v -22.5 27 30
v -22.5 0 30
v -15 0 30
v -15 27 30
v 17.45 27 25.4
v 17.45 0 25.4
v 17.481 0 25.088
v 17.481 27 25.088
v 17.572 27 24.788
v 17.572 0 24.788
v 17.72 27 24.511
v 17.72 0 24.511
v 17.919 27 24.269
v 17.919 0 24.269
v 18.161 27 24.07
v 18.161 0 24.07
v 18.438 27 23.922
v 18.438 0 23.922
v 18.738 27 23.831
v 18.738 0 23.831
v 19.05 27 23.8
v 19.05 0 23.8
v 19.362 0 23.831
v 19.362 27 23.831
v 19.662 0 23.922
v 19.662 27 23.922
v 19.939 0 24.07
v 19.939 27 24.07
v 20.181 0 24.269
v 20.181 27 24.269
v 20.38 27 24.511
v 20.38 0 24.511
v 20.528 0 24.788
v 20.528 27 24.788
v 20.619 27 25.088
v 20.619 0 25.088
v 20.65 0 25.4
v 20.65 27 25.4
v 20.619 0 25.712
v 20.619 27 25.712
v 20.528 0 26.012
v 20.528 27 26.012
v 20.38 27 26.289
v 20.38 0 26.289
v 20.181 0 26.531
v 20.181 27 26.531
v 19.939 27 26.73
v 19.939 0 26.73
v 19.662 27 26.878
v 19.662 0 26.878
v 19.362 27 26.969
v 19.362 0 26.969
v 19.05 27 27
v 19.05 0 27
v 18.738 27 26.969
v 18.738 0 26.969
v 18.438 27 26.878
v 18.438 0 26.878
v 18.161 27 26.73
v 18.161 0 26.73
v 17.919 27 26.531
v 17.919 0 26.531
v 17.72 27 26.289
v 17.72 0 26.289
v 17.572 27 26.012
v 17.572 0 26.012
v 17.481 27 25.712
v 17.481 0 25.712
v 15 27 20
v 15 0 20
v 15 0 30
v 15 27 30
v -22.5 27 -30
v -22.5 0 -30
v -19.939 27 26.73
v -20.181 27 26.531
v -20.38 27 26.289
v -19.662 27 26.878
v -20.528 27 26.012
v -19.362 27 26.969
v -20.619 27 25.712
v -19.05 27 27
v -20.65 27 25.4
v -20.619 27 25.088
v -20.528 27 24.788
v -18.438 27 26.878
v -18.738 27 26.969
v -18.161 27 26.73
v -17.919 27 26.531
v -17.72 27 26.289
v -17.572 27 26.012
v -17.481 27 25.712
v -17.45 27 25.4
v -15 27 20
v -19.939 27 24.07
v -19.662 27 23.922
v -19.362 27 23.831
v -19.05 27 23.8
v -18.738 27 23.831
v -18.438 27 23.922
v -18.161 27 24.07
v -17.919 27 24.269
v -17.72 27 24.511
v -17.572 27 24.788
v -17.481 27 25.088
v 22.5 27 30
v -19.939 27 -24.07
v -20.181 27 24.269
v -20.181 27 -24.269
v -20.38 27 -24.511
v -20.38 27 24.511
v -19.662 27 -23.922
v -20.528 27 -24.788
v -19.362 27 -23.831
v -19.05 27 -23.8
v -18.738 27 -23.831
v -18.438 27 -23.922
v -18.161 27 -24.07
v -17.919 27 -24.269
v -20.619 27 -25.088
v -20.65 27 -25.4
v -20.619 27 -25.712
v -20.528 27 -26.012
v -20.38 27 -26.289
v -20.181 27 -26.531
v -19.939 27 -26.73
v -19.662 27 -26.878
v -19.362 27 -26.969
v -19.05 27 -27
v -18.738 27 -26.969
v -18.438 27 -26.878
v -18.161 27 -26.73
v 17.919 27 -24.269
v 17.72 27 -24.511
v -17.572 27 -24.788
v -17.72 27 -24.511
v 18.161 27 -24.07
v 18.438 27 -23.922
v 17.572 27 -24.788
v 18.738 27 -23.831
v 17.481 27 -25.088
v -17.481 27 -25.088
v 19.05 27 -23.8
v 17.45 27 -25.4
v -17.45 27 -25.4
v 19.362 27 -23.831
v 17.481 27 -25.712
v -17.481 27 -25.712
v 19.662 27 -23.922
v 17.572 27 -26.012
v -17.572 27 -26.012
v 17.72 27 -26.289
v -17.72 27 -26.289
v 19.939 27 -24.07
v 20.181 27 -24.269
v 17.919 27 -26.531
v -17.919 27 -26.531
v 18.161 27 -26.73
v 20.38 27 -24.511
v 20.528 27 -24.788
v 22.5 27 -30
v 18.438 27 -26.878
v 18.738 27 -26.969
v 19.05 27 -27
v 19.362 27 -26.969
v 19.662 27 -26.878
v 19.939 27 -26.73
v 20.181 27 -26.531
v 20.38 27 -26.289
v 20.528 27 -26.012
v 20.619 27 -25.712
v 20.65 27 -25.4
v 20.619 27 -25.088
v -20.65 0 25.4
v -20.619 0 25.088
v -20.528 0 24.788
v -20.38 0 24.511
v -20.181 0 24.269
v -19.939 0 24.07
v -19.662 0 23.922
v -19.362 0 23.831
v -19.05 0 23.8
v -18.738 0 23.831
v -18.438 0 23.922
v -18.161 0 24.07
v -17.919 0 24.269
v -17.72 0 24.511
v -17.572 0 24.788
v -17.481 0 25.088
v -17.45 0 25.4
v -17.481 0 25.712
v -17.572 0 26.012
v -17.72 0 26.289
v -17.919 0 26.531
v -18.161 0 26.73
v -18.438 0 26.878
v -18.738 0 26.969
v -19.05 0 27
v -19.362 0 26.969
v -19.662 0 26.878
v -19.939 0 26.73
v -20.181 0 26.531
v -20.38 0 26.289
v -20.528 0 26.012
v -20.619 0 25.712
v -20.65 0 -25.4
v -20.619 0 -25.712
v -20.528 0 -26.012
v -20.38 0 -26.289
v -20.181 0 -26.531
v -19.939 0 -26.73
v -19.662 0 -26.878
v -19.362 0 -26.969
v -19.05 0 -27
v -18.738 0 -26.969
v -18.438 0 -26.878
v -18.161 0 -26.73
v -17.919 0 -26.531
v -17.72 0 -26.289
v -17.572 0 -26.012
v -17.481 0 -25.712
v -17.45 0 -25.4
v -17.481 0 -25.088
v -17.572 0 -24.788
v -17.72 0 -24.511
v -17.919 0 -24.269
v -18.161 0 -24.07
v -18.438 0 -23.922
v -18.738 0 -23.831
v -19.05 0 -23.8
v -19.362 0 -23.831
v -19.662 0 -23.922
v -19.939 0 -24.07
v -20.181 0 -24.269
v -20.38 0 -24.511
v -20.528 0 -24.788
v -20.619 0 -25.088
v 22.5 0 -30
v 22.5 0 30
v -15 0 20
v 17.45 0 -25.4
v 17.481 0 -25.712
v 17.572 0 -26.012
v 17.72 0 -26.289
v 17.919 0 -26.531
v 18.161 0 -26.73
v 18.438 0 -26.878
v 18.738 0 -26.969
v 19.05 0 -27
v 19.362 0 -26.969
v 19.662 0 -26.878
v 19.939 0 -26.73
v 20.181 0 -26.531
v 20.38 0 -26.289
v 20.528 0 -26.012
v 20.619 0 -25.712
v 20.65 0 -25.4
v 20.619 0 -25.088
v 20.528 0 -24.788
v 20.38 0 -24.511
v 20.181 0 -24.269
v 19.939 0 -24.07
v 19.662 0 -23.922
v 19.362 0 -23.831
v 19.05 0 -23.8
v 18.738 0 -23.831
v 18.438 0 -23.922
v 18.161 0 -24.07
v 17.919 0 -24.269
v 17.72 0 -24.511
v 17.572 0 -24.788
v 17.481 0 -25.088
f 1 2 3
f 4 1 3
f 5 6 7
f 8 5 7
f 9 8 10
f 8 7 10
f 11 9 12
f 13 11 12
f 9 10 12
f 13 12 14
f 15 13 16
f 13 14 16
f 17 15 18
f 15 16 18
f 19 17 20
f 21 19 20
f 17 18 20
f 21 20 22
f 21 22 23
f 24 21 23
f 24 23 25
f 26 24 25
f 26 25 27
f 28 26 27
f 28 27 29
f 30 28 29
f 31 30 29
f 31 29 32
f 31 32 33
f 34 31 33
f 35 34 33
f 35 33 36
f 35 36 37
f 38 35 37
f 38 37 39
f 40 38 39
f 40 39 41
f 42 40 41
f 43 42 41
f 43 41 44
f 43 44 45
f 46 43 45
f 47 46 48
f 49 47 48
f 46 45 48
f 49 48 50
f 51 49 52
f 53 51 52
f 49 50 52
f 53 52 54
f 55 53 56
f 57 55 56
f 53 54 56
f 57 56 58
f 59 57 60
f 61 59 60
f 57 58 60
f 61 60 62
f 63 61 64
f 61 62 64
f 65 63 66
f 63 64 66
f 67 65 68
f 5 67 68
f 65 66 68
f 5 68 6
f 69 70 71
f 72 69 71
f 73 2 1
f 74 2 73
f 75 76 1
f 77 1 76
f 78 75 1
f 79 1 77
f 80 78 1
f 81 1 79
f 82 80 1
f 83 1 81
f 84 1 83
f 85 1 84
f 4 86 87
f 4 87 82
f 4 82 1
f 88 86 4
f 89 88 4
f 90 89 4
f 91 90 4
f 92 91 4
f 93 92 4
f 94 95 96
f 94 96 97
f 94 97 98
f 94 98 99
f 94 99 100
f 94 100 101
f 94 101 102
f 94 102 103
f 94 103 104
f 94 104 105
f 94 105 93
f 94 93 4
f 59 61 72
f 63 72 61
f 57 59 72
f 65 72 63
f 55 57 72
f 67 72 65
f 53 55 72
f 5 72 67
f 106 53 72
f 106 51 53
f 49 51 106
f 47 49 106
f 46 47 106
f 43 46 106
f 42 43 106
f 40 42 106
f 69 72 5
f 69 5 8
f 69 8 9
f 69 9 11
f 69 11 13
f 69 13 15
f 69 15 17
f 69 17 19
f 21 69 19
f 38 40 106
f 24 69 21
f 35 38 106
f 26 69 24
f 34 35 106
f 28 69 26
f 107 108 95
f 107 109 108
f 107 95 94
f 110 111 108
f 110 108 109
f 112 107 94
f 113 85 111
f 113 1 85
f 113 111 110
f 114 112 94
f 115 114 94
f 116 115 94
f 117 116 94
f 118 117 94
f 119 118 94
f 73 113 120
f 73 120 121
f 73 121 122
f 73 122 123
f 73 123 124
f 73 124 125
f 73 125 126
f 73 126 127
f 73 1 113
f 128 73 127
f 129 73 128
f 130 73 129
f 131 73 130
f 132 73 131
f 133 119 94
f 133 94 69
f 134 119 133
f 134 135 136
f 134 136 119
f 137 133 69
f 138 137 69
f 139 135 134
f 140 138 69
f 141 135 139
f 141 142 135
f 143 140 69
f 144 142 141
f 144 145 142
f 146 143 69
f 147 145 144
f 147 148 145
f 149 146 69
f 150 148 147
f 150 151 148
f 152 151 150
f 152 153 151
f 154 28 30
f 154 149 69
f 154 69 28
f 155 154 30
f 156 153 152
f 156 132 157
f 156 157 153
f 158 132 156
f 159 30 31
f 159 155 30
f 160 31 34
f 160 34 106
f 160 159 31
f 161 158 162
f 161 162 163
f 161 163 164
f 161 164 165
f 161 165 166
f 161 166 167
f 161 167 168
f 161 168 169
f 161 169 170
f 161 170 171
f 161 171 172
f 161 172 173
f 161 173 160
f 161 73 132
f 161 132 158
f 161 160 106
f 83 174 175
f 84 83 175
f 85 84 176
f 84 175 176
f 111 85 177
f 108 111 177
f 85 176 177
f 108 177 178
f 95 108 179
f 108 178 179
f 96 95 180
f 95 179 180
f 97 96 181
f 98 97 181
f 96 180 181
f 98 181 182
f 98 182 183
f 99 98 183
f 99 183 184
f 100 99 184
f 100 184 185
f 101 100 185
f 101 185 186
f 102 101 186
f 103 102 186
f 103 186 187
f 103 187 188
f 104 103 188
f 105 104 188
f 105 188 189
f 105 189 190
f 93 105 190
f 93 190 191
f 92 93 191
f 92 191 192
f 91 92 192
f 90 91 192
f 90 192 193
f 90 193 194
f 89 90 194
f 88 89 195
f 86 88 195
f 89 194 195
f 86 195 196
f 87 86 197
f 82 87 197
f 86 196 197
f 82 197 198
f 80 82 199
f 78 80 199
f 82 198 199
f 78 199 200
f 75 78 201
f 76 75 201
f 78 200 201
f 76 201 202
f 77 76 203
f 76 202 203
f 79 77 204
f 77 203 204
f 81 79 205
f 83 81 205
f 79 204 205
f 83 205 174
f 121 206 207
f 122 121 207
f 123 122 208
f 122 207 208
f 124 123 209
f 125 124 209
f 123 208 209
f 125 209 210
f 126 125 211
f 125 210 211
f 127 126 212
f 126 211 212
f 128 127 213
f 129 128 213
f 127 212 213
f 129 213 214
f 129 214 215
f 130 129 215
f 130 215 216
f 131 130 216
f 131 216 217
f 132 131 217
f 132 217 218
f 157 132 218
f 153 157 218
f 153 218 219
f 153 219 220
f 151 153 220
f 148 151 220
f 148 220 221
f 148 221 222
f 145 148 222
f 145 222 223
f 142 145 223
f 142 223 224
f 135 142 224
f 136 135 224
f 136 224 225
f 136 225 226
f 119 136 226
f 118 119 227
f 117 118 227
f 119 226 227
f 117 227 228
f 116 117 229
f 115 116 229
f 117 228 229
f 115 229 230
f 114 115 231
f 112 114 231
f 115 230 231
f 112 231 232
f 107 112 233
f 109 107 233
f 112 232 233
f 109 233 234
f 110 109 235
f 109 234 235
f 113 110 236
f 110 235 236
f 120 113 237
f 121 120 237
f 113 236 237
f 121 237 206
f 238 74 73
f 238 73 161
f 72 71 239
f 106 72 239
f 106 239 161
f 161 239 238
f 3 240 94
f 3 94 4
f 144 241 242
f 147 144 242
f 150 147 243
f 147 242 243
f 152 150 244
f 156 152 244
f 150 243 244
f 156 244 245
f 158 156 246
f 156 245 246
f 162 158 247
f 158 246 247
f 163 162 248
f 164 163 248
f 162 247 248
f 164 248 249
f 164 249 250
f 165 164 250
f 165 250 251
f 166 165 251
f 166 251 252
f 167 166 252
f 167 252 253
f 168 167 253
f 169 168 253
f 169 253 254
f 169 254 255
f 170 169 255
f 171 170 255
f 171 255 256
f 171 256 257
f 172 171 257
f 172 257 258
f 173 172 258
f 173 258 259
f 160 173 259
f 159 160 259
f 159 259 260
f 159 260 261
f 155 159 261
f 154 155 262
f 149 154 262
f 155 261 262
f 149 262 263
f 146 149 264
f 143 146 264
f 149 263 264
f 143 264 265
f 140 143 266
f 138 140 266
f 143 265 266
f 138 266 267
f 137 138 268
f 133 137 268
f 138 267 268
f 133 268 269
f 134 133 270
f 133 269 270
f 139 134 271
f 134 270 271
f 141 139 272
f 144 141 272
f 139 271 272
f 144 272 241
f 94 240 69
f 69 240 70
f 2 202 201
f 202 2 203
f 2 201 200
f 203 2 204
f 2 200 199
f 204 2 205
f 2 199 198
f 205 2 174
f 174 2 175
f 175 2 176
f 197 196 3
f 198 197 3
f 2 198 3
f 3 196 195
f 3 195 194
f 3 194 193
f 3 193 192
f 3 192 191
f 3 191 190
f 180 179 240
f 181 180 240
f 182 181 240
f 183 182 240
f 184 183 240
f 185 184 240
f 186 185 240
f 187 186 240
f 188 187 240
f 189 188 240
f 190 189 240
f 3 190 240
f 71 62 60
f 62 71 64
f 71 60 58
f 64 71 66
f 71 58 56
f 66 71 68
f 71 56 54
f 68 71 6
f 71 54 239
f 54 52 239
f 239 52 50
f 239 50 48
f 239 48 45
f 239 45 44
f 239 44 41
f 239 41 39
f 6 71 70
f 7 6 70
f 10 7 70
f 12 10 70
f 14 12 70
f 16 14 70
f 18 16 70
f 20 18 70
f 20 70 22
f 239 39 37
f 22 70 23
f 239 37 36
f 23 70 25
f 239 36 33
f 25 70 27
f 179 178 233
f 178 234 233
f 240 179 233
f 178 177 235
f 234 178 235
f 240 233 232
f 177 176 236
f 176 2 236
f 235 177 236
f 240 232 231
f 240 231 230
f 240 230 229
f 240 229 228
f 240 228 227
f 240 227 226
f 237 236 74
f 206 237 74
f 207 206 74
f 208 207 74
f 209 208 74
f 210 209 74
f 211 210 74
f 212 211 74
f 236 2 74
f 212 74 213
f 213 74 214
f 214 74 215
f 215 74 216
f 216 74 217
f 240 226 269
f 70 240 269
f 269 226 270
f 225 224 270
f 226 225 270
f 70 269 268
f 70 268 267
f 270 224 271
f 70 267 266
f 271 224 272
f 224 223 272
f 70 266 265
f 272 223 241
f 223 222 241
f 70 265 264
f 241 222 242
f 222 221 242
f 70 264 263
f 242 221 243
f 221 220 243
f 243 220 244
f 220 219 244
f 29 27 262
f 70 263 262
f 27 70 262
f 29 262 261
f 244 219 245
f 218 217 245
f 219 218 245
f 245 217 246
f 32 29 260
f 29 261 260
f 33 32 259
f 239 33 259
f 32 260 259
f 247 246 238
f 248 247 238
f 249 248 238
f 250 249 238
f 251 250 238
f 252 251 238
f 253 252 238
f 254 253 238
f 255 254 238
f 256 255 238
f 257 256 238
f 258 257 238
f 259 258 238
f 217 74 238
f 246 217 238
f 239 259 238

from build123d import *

# Parameters (mm, degrees)
ESQUISSE1_W             = 45
ESQUISSE1_H             = 60
BOSS_EXTRU_1_DEPTH      = 27
D_GAGEMENT_M31_D        = 3.2
ESQUISSE4_W             = 30
ESQUISSE4_H             = 10
ENL_V_MAT_EXTRU_1_DEPTH = 27


with BuildPart() as part:
    # Esquisse1 → Boss.-Extru.1 (new body)
    with BuildSketch(Plane(origin=(0, 0, 0), x_dir=(1, 0, 0), z_dir=(0, 1, 0))):
        Rectangle(ESQUISSE1_W, ESQUISSE1_H)
    extrude(amount=BOSS_EXTRU_1_DEPTH)

    # Dégagement M31 (through all)
    with Locations(Plane(origin=(0, 27, 0), x_dir=(1, 0, 0), z_dir=(0, 1, 0))):
        with Locations((-19.05, 25.4), (19.05, 25.4), (19.05, -25.4), (-19.05, -25.4)):
            Hole(D_GAGEMENT_M31_D / 2)

    # Esquisse4 → Enlèv. mat.-Extru.1 (cut)
    with BuildSketch(Plane.XZ):
        with Locations((0, 25)):
            Rectangle(ESQUISSE4_W, ESQUISSE4_H)
    extrude(amount=-ENL_V_MAT_EXTRU_1_DEPTH, mode=Mode.SUBTRACT)


solid = part.part
